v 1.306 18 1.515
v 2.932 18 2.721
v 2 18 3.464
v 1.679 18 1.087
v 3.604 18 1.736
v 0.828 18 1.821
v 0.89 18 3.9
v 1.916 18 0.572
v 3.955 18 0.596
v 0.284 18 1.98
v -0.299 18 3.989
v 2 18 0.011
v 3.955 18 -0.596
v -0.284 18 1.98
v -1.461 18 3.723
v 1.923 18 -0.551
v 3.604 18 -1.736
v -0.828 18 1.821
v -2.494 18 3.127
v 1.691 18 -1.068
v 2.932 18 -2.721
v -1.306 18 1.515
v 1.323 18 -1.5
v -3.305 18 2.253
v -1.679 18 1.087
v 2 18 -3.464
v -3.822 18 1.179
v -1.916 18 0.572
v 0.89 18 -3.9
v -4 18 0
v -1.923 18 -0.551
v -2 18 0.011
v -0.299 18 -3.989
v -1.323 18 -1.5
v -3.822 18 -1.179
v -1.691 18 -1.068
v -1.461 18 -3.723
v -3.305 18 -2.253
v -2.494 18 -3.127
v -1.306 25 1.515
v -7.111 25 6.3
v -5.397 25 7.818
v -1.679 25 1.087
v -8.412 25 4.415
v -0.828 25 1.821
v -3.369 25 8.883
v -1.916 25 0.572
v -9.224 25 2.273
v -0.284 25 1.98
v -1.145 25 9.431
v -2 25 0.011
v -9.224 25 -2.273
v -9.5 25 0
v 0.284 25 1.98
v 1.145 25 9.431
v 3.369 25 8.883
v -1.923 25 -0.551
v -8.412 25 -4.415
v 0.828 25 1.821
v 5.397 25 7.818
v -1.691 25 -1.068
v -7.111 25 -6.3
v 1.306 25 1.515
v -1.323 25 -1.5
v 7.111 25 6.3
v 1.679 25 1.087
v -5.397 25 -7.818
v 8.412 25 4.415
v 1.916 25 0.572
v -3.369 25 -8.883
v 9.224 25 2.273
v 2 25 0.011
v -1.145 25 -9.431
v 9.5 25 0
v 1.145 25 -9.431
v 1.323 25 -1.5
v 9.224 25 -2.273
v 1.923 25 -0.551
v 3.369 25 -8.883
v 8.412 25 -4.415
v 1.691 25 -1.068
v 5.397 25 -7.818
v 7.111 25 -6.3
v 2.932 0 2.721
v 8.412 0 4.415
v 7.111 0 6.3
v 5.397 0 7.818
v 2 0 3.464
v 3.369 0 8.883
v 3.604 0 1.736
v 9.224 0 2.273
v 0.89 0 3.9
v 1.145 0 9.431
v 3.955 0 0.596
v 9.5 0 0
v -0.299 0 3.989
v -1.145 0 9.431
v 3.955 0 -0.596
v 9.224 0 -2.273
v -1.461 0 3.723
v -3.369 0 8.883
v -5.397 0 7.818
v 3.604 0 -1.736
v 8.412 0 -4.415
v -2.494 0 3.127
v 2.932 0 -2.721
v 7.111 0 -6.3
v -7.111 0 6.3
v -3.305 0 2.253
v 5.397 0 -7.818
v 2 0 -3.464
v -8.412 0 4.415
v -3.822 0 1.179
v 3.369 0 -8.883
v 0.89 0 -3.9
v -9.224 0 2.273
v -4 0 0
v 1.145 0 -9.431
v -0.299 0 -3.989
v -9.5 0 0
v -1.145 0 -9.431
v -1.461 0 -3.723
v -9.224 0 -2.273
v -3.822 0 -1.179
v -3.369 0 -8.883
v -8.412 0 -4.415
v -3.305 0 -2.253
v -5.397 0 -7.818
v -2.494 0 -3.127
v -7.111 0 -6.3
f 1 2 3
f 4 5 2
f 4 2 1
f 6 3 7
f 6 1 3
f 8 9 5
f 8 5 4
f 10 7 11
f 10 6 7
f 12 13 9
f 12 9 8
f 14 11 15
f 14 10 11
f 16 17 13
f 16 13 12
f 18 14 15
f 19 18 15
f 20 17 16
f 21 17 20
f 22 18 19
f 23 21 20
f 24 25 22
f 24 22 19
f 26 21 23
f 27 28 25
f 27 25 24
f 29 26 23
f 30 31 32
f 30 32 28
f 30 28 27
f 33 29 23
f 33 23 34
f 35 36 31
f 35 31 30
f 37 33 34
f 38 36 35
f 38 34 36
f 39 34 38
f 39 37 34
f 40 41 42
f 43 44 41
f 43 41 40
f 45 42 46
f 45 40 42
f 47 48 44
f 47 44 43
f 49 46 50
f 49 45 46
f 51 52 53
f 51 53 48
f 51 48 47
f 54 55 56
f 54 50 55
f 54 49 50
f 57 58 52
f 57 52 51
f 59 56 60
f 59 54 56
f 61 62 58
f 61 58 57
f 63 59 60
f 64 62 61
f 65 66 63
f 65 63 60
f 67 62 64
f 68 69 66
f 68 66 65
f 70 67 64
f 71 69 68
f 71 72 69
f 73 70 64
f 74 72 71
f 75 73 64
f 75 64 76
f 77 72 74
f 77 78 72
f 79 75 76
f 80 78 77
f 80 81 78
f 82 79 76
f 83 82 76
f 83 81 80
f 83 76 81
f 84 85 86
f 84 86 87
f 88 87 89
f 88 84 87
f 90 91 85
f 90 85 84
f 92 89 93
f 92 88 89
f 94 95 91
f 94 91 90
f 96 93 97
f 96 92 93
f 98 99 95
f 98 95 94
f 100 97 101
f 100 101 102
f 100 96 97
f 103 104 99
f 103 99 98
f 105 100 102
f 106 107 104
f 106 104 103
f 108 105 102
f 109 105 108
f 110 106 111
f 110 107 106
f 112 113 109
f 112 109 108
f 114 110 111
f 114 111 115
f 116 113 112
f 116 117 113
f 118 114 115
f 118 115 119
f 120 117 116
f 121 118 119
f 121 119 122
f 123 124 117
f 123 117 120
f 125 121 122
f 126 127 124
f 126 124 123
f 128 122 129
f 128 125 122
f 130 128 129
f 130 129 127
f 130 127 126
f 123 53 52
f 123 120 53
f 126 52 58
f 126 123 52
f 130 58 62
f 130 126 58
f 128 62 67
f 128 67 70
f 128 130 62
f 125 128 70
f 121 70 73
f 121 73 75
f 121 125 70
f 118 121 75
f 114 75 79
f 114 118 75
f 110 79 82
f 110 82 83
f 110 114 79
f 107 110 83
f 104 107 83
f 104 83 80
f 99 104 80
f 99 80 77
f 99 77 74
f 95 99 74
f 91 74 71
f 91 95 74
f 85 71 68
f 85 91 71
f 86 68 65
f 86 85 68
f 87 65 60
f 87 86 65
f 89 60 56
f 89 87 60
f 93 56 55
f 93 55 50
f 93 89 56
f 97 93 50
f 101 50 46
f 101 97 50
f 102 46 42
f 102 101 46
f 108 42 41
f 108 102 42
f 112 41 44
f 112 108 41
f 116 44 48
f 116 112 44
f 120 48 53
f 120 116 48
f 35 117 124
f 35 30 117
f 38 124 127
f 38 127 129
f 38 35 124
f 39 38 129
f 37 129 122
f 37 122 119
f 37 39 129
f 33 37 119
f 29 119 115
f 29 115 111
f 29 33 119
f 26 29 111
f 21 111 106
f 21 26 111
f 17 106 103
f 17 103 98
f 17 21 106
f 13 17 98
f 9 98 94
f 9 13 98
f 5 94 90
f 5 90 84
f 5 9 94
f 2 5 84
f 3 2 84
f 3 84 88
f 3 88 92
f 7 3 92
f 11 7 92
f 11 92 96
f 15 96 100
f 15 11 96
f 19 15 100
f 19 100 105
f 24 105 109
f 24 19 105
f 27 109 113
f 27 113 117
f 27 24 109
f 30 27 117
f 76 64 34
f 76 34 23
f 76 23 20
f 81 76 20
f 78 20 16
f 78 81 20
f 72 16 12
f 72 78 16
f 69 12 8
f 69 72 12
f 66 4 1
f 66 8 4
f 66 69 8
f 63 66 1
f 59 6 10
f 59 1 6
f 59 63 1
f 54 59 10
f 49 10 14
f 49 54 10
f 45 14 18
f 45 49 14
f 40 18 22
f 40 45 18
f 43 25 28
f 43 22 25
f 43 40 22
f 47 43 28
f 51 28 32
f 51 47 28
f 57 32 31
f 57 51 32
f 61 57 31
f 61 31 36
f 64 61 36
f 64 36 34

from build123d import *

# Parameters (mm, degrees)
BOSS_EXTRU_1_DEPTH = 7


with BuildPart() as part:
    # Esquisse1 → Révolution1 (revolve)
    with BuildSketch(Plane.XY):
        Polygon((-4, 0), (-4, 18), (-2, 18), (-2, 25), (-9.5, 25), (-9.5, 0), align=None)
    revolve(axis=Axis((0, 0, 0), (0, -1, 0)))

    # Esquisse2 → Boss.-Extru.1 (add)
    with BuildSketch(Plane(origin=(0, 25, 0), x_dir=(1, 0, 0), z_dir=(0, 1, 0))):
        with BuildLine():
            Line((-1.322875656, 1.5), (1.322875656, 1.5))
            ThreePointArc((1.322875656, 1.5), (0, 2), (-1.322875656, 1.5))
        make_face()
    extrude(amount=-BOSS_EXTRU_1_DEPTH)


solid = part.part
